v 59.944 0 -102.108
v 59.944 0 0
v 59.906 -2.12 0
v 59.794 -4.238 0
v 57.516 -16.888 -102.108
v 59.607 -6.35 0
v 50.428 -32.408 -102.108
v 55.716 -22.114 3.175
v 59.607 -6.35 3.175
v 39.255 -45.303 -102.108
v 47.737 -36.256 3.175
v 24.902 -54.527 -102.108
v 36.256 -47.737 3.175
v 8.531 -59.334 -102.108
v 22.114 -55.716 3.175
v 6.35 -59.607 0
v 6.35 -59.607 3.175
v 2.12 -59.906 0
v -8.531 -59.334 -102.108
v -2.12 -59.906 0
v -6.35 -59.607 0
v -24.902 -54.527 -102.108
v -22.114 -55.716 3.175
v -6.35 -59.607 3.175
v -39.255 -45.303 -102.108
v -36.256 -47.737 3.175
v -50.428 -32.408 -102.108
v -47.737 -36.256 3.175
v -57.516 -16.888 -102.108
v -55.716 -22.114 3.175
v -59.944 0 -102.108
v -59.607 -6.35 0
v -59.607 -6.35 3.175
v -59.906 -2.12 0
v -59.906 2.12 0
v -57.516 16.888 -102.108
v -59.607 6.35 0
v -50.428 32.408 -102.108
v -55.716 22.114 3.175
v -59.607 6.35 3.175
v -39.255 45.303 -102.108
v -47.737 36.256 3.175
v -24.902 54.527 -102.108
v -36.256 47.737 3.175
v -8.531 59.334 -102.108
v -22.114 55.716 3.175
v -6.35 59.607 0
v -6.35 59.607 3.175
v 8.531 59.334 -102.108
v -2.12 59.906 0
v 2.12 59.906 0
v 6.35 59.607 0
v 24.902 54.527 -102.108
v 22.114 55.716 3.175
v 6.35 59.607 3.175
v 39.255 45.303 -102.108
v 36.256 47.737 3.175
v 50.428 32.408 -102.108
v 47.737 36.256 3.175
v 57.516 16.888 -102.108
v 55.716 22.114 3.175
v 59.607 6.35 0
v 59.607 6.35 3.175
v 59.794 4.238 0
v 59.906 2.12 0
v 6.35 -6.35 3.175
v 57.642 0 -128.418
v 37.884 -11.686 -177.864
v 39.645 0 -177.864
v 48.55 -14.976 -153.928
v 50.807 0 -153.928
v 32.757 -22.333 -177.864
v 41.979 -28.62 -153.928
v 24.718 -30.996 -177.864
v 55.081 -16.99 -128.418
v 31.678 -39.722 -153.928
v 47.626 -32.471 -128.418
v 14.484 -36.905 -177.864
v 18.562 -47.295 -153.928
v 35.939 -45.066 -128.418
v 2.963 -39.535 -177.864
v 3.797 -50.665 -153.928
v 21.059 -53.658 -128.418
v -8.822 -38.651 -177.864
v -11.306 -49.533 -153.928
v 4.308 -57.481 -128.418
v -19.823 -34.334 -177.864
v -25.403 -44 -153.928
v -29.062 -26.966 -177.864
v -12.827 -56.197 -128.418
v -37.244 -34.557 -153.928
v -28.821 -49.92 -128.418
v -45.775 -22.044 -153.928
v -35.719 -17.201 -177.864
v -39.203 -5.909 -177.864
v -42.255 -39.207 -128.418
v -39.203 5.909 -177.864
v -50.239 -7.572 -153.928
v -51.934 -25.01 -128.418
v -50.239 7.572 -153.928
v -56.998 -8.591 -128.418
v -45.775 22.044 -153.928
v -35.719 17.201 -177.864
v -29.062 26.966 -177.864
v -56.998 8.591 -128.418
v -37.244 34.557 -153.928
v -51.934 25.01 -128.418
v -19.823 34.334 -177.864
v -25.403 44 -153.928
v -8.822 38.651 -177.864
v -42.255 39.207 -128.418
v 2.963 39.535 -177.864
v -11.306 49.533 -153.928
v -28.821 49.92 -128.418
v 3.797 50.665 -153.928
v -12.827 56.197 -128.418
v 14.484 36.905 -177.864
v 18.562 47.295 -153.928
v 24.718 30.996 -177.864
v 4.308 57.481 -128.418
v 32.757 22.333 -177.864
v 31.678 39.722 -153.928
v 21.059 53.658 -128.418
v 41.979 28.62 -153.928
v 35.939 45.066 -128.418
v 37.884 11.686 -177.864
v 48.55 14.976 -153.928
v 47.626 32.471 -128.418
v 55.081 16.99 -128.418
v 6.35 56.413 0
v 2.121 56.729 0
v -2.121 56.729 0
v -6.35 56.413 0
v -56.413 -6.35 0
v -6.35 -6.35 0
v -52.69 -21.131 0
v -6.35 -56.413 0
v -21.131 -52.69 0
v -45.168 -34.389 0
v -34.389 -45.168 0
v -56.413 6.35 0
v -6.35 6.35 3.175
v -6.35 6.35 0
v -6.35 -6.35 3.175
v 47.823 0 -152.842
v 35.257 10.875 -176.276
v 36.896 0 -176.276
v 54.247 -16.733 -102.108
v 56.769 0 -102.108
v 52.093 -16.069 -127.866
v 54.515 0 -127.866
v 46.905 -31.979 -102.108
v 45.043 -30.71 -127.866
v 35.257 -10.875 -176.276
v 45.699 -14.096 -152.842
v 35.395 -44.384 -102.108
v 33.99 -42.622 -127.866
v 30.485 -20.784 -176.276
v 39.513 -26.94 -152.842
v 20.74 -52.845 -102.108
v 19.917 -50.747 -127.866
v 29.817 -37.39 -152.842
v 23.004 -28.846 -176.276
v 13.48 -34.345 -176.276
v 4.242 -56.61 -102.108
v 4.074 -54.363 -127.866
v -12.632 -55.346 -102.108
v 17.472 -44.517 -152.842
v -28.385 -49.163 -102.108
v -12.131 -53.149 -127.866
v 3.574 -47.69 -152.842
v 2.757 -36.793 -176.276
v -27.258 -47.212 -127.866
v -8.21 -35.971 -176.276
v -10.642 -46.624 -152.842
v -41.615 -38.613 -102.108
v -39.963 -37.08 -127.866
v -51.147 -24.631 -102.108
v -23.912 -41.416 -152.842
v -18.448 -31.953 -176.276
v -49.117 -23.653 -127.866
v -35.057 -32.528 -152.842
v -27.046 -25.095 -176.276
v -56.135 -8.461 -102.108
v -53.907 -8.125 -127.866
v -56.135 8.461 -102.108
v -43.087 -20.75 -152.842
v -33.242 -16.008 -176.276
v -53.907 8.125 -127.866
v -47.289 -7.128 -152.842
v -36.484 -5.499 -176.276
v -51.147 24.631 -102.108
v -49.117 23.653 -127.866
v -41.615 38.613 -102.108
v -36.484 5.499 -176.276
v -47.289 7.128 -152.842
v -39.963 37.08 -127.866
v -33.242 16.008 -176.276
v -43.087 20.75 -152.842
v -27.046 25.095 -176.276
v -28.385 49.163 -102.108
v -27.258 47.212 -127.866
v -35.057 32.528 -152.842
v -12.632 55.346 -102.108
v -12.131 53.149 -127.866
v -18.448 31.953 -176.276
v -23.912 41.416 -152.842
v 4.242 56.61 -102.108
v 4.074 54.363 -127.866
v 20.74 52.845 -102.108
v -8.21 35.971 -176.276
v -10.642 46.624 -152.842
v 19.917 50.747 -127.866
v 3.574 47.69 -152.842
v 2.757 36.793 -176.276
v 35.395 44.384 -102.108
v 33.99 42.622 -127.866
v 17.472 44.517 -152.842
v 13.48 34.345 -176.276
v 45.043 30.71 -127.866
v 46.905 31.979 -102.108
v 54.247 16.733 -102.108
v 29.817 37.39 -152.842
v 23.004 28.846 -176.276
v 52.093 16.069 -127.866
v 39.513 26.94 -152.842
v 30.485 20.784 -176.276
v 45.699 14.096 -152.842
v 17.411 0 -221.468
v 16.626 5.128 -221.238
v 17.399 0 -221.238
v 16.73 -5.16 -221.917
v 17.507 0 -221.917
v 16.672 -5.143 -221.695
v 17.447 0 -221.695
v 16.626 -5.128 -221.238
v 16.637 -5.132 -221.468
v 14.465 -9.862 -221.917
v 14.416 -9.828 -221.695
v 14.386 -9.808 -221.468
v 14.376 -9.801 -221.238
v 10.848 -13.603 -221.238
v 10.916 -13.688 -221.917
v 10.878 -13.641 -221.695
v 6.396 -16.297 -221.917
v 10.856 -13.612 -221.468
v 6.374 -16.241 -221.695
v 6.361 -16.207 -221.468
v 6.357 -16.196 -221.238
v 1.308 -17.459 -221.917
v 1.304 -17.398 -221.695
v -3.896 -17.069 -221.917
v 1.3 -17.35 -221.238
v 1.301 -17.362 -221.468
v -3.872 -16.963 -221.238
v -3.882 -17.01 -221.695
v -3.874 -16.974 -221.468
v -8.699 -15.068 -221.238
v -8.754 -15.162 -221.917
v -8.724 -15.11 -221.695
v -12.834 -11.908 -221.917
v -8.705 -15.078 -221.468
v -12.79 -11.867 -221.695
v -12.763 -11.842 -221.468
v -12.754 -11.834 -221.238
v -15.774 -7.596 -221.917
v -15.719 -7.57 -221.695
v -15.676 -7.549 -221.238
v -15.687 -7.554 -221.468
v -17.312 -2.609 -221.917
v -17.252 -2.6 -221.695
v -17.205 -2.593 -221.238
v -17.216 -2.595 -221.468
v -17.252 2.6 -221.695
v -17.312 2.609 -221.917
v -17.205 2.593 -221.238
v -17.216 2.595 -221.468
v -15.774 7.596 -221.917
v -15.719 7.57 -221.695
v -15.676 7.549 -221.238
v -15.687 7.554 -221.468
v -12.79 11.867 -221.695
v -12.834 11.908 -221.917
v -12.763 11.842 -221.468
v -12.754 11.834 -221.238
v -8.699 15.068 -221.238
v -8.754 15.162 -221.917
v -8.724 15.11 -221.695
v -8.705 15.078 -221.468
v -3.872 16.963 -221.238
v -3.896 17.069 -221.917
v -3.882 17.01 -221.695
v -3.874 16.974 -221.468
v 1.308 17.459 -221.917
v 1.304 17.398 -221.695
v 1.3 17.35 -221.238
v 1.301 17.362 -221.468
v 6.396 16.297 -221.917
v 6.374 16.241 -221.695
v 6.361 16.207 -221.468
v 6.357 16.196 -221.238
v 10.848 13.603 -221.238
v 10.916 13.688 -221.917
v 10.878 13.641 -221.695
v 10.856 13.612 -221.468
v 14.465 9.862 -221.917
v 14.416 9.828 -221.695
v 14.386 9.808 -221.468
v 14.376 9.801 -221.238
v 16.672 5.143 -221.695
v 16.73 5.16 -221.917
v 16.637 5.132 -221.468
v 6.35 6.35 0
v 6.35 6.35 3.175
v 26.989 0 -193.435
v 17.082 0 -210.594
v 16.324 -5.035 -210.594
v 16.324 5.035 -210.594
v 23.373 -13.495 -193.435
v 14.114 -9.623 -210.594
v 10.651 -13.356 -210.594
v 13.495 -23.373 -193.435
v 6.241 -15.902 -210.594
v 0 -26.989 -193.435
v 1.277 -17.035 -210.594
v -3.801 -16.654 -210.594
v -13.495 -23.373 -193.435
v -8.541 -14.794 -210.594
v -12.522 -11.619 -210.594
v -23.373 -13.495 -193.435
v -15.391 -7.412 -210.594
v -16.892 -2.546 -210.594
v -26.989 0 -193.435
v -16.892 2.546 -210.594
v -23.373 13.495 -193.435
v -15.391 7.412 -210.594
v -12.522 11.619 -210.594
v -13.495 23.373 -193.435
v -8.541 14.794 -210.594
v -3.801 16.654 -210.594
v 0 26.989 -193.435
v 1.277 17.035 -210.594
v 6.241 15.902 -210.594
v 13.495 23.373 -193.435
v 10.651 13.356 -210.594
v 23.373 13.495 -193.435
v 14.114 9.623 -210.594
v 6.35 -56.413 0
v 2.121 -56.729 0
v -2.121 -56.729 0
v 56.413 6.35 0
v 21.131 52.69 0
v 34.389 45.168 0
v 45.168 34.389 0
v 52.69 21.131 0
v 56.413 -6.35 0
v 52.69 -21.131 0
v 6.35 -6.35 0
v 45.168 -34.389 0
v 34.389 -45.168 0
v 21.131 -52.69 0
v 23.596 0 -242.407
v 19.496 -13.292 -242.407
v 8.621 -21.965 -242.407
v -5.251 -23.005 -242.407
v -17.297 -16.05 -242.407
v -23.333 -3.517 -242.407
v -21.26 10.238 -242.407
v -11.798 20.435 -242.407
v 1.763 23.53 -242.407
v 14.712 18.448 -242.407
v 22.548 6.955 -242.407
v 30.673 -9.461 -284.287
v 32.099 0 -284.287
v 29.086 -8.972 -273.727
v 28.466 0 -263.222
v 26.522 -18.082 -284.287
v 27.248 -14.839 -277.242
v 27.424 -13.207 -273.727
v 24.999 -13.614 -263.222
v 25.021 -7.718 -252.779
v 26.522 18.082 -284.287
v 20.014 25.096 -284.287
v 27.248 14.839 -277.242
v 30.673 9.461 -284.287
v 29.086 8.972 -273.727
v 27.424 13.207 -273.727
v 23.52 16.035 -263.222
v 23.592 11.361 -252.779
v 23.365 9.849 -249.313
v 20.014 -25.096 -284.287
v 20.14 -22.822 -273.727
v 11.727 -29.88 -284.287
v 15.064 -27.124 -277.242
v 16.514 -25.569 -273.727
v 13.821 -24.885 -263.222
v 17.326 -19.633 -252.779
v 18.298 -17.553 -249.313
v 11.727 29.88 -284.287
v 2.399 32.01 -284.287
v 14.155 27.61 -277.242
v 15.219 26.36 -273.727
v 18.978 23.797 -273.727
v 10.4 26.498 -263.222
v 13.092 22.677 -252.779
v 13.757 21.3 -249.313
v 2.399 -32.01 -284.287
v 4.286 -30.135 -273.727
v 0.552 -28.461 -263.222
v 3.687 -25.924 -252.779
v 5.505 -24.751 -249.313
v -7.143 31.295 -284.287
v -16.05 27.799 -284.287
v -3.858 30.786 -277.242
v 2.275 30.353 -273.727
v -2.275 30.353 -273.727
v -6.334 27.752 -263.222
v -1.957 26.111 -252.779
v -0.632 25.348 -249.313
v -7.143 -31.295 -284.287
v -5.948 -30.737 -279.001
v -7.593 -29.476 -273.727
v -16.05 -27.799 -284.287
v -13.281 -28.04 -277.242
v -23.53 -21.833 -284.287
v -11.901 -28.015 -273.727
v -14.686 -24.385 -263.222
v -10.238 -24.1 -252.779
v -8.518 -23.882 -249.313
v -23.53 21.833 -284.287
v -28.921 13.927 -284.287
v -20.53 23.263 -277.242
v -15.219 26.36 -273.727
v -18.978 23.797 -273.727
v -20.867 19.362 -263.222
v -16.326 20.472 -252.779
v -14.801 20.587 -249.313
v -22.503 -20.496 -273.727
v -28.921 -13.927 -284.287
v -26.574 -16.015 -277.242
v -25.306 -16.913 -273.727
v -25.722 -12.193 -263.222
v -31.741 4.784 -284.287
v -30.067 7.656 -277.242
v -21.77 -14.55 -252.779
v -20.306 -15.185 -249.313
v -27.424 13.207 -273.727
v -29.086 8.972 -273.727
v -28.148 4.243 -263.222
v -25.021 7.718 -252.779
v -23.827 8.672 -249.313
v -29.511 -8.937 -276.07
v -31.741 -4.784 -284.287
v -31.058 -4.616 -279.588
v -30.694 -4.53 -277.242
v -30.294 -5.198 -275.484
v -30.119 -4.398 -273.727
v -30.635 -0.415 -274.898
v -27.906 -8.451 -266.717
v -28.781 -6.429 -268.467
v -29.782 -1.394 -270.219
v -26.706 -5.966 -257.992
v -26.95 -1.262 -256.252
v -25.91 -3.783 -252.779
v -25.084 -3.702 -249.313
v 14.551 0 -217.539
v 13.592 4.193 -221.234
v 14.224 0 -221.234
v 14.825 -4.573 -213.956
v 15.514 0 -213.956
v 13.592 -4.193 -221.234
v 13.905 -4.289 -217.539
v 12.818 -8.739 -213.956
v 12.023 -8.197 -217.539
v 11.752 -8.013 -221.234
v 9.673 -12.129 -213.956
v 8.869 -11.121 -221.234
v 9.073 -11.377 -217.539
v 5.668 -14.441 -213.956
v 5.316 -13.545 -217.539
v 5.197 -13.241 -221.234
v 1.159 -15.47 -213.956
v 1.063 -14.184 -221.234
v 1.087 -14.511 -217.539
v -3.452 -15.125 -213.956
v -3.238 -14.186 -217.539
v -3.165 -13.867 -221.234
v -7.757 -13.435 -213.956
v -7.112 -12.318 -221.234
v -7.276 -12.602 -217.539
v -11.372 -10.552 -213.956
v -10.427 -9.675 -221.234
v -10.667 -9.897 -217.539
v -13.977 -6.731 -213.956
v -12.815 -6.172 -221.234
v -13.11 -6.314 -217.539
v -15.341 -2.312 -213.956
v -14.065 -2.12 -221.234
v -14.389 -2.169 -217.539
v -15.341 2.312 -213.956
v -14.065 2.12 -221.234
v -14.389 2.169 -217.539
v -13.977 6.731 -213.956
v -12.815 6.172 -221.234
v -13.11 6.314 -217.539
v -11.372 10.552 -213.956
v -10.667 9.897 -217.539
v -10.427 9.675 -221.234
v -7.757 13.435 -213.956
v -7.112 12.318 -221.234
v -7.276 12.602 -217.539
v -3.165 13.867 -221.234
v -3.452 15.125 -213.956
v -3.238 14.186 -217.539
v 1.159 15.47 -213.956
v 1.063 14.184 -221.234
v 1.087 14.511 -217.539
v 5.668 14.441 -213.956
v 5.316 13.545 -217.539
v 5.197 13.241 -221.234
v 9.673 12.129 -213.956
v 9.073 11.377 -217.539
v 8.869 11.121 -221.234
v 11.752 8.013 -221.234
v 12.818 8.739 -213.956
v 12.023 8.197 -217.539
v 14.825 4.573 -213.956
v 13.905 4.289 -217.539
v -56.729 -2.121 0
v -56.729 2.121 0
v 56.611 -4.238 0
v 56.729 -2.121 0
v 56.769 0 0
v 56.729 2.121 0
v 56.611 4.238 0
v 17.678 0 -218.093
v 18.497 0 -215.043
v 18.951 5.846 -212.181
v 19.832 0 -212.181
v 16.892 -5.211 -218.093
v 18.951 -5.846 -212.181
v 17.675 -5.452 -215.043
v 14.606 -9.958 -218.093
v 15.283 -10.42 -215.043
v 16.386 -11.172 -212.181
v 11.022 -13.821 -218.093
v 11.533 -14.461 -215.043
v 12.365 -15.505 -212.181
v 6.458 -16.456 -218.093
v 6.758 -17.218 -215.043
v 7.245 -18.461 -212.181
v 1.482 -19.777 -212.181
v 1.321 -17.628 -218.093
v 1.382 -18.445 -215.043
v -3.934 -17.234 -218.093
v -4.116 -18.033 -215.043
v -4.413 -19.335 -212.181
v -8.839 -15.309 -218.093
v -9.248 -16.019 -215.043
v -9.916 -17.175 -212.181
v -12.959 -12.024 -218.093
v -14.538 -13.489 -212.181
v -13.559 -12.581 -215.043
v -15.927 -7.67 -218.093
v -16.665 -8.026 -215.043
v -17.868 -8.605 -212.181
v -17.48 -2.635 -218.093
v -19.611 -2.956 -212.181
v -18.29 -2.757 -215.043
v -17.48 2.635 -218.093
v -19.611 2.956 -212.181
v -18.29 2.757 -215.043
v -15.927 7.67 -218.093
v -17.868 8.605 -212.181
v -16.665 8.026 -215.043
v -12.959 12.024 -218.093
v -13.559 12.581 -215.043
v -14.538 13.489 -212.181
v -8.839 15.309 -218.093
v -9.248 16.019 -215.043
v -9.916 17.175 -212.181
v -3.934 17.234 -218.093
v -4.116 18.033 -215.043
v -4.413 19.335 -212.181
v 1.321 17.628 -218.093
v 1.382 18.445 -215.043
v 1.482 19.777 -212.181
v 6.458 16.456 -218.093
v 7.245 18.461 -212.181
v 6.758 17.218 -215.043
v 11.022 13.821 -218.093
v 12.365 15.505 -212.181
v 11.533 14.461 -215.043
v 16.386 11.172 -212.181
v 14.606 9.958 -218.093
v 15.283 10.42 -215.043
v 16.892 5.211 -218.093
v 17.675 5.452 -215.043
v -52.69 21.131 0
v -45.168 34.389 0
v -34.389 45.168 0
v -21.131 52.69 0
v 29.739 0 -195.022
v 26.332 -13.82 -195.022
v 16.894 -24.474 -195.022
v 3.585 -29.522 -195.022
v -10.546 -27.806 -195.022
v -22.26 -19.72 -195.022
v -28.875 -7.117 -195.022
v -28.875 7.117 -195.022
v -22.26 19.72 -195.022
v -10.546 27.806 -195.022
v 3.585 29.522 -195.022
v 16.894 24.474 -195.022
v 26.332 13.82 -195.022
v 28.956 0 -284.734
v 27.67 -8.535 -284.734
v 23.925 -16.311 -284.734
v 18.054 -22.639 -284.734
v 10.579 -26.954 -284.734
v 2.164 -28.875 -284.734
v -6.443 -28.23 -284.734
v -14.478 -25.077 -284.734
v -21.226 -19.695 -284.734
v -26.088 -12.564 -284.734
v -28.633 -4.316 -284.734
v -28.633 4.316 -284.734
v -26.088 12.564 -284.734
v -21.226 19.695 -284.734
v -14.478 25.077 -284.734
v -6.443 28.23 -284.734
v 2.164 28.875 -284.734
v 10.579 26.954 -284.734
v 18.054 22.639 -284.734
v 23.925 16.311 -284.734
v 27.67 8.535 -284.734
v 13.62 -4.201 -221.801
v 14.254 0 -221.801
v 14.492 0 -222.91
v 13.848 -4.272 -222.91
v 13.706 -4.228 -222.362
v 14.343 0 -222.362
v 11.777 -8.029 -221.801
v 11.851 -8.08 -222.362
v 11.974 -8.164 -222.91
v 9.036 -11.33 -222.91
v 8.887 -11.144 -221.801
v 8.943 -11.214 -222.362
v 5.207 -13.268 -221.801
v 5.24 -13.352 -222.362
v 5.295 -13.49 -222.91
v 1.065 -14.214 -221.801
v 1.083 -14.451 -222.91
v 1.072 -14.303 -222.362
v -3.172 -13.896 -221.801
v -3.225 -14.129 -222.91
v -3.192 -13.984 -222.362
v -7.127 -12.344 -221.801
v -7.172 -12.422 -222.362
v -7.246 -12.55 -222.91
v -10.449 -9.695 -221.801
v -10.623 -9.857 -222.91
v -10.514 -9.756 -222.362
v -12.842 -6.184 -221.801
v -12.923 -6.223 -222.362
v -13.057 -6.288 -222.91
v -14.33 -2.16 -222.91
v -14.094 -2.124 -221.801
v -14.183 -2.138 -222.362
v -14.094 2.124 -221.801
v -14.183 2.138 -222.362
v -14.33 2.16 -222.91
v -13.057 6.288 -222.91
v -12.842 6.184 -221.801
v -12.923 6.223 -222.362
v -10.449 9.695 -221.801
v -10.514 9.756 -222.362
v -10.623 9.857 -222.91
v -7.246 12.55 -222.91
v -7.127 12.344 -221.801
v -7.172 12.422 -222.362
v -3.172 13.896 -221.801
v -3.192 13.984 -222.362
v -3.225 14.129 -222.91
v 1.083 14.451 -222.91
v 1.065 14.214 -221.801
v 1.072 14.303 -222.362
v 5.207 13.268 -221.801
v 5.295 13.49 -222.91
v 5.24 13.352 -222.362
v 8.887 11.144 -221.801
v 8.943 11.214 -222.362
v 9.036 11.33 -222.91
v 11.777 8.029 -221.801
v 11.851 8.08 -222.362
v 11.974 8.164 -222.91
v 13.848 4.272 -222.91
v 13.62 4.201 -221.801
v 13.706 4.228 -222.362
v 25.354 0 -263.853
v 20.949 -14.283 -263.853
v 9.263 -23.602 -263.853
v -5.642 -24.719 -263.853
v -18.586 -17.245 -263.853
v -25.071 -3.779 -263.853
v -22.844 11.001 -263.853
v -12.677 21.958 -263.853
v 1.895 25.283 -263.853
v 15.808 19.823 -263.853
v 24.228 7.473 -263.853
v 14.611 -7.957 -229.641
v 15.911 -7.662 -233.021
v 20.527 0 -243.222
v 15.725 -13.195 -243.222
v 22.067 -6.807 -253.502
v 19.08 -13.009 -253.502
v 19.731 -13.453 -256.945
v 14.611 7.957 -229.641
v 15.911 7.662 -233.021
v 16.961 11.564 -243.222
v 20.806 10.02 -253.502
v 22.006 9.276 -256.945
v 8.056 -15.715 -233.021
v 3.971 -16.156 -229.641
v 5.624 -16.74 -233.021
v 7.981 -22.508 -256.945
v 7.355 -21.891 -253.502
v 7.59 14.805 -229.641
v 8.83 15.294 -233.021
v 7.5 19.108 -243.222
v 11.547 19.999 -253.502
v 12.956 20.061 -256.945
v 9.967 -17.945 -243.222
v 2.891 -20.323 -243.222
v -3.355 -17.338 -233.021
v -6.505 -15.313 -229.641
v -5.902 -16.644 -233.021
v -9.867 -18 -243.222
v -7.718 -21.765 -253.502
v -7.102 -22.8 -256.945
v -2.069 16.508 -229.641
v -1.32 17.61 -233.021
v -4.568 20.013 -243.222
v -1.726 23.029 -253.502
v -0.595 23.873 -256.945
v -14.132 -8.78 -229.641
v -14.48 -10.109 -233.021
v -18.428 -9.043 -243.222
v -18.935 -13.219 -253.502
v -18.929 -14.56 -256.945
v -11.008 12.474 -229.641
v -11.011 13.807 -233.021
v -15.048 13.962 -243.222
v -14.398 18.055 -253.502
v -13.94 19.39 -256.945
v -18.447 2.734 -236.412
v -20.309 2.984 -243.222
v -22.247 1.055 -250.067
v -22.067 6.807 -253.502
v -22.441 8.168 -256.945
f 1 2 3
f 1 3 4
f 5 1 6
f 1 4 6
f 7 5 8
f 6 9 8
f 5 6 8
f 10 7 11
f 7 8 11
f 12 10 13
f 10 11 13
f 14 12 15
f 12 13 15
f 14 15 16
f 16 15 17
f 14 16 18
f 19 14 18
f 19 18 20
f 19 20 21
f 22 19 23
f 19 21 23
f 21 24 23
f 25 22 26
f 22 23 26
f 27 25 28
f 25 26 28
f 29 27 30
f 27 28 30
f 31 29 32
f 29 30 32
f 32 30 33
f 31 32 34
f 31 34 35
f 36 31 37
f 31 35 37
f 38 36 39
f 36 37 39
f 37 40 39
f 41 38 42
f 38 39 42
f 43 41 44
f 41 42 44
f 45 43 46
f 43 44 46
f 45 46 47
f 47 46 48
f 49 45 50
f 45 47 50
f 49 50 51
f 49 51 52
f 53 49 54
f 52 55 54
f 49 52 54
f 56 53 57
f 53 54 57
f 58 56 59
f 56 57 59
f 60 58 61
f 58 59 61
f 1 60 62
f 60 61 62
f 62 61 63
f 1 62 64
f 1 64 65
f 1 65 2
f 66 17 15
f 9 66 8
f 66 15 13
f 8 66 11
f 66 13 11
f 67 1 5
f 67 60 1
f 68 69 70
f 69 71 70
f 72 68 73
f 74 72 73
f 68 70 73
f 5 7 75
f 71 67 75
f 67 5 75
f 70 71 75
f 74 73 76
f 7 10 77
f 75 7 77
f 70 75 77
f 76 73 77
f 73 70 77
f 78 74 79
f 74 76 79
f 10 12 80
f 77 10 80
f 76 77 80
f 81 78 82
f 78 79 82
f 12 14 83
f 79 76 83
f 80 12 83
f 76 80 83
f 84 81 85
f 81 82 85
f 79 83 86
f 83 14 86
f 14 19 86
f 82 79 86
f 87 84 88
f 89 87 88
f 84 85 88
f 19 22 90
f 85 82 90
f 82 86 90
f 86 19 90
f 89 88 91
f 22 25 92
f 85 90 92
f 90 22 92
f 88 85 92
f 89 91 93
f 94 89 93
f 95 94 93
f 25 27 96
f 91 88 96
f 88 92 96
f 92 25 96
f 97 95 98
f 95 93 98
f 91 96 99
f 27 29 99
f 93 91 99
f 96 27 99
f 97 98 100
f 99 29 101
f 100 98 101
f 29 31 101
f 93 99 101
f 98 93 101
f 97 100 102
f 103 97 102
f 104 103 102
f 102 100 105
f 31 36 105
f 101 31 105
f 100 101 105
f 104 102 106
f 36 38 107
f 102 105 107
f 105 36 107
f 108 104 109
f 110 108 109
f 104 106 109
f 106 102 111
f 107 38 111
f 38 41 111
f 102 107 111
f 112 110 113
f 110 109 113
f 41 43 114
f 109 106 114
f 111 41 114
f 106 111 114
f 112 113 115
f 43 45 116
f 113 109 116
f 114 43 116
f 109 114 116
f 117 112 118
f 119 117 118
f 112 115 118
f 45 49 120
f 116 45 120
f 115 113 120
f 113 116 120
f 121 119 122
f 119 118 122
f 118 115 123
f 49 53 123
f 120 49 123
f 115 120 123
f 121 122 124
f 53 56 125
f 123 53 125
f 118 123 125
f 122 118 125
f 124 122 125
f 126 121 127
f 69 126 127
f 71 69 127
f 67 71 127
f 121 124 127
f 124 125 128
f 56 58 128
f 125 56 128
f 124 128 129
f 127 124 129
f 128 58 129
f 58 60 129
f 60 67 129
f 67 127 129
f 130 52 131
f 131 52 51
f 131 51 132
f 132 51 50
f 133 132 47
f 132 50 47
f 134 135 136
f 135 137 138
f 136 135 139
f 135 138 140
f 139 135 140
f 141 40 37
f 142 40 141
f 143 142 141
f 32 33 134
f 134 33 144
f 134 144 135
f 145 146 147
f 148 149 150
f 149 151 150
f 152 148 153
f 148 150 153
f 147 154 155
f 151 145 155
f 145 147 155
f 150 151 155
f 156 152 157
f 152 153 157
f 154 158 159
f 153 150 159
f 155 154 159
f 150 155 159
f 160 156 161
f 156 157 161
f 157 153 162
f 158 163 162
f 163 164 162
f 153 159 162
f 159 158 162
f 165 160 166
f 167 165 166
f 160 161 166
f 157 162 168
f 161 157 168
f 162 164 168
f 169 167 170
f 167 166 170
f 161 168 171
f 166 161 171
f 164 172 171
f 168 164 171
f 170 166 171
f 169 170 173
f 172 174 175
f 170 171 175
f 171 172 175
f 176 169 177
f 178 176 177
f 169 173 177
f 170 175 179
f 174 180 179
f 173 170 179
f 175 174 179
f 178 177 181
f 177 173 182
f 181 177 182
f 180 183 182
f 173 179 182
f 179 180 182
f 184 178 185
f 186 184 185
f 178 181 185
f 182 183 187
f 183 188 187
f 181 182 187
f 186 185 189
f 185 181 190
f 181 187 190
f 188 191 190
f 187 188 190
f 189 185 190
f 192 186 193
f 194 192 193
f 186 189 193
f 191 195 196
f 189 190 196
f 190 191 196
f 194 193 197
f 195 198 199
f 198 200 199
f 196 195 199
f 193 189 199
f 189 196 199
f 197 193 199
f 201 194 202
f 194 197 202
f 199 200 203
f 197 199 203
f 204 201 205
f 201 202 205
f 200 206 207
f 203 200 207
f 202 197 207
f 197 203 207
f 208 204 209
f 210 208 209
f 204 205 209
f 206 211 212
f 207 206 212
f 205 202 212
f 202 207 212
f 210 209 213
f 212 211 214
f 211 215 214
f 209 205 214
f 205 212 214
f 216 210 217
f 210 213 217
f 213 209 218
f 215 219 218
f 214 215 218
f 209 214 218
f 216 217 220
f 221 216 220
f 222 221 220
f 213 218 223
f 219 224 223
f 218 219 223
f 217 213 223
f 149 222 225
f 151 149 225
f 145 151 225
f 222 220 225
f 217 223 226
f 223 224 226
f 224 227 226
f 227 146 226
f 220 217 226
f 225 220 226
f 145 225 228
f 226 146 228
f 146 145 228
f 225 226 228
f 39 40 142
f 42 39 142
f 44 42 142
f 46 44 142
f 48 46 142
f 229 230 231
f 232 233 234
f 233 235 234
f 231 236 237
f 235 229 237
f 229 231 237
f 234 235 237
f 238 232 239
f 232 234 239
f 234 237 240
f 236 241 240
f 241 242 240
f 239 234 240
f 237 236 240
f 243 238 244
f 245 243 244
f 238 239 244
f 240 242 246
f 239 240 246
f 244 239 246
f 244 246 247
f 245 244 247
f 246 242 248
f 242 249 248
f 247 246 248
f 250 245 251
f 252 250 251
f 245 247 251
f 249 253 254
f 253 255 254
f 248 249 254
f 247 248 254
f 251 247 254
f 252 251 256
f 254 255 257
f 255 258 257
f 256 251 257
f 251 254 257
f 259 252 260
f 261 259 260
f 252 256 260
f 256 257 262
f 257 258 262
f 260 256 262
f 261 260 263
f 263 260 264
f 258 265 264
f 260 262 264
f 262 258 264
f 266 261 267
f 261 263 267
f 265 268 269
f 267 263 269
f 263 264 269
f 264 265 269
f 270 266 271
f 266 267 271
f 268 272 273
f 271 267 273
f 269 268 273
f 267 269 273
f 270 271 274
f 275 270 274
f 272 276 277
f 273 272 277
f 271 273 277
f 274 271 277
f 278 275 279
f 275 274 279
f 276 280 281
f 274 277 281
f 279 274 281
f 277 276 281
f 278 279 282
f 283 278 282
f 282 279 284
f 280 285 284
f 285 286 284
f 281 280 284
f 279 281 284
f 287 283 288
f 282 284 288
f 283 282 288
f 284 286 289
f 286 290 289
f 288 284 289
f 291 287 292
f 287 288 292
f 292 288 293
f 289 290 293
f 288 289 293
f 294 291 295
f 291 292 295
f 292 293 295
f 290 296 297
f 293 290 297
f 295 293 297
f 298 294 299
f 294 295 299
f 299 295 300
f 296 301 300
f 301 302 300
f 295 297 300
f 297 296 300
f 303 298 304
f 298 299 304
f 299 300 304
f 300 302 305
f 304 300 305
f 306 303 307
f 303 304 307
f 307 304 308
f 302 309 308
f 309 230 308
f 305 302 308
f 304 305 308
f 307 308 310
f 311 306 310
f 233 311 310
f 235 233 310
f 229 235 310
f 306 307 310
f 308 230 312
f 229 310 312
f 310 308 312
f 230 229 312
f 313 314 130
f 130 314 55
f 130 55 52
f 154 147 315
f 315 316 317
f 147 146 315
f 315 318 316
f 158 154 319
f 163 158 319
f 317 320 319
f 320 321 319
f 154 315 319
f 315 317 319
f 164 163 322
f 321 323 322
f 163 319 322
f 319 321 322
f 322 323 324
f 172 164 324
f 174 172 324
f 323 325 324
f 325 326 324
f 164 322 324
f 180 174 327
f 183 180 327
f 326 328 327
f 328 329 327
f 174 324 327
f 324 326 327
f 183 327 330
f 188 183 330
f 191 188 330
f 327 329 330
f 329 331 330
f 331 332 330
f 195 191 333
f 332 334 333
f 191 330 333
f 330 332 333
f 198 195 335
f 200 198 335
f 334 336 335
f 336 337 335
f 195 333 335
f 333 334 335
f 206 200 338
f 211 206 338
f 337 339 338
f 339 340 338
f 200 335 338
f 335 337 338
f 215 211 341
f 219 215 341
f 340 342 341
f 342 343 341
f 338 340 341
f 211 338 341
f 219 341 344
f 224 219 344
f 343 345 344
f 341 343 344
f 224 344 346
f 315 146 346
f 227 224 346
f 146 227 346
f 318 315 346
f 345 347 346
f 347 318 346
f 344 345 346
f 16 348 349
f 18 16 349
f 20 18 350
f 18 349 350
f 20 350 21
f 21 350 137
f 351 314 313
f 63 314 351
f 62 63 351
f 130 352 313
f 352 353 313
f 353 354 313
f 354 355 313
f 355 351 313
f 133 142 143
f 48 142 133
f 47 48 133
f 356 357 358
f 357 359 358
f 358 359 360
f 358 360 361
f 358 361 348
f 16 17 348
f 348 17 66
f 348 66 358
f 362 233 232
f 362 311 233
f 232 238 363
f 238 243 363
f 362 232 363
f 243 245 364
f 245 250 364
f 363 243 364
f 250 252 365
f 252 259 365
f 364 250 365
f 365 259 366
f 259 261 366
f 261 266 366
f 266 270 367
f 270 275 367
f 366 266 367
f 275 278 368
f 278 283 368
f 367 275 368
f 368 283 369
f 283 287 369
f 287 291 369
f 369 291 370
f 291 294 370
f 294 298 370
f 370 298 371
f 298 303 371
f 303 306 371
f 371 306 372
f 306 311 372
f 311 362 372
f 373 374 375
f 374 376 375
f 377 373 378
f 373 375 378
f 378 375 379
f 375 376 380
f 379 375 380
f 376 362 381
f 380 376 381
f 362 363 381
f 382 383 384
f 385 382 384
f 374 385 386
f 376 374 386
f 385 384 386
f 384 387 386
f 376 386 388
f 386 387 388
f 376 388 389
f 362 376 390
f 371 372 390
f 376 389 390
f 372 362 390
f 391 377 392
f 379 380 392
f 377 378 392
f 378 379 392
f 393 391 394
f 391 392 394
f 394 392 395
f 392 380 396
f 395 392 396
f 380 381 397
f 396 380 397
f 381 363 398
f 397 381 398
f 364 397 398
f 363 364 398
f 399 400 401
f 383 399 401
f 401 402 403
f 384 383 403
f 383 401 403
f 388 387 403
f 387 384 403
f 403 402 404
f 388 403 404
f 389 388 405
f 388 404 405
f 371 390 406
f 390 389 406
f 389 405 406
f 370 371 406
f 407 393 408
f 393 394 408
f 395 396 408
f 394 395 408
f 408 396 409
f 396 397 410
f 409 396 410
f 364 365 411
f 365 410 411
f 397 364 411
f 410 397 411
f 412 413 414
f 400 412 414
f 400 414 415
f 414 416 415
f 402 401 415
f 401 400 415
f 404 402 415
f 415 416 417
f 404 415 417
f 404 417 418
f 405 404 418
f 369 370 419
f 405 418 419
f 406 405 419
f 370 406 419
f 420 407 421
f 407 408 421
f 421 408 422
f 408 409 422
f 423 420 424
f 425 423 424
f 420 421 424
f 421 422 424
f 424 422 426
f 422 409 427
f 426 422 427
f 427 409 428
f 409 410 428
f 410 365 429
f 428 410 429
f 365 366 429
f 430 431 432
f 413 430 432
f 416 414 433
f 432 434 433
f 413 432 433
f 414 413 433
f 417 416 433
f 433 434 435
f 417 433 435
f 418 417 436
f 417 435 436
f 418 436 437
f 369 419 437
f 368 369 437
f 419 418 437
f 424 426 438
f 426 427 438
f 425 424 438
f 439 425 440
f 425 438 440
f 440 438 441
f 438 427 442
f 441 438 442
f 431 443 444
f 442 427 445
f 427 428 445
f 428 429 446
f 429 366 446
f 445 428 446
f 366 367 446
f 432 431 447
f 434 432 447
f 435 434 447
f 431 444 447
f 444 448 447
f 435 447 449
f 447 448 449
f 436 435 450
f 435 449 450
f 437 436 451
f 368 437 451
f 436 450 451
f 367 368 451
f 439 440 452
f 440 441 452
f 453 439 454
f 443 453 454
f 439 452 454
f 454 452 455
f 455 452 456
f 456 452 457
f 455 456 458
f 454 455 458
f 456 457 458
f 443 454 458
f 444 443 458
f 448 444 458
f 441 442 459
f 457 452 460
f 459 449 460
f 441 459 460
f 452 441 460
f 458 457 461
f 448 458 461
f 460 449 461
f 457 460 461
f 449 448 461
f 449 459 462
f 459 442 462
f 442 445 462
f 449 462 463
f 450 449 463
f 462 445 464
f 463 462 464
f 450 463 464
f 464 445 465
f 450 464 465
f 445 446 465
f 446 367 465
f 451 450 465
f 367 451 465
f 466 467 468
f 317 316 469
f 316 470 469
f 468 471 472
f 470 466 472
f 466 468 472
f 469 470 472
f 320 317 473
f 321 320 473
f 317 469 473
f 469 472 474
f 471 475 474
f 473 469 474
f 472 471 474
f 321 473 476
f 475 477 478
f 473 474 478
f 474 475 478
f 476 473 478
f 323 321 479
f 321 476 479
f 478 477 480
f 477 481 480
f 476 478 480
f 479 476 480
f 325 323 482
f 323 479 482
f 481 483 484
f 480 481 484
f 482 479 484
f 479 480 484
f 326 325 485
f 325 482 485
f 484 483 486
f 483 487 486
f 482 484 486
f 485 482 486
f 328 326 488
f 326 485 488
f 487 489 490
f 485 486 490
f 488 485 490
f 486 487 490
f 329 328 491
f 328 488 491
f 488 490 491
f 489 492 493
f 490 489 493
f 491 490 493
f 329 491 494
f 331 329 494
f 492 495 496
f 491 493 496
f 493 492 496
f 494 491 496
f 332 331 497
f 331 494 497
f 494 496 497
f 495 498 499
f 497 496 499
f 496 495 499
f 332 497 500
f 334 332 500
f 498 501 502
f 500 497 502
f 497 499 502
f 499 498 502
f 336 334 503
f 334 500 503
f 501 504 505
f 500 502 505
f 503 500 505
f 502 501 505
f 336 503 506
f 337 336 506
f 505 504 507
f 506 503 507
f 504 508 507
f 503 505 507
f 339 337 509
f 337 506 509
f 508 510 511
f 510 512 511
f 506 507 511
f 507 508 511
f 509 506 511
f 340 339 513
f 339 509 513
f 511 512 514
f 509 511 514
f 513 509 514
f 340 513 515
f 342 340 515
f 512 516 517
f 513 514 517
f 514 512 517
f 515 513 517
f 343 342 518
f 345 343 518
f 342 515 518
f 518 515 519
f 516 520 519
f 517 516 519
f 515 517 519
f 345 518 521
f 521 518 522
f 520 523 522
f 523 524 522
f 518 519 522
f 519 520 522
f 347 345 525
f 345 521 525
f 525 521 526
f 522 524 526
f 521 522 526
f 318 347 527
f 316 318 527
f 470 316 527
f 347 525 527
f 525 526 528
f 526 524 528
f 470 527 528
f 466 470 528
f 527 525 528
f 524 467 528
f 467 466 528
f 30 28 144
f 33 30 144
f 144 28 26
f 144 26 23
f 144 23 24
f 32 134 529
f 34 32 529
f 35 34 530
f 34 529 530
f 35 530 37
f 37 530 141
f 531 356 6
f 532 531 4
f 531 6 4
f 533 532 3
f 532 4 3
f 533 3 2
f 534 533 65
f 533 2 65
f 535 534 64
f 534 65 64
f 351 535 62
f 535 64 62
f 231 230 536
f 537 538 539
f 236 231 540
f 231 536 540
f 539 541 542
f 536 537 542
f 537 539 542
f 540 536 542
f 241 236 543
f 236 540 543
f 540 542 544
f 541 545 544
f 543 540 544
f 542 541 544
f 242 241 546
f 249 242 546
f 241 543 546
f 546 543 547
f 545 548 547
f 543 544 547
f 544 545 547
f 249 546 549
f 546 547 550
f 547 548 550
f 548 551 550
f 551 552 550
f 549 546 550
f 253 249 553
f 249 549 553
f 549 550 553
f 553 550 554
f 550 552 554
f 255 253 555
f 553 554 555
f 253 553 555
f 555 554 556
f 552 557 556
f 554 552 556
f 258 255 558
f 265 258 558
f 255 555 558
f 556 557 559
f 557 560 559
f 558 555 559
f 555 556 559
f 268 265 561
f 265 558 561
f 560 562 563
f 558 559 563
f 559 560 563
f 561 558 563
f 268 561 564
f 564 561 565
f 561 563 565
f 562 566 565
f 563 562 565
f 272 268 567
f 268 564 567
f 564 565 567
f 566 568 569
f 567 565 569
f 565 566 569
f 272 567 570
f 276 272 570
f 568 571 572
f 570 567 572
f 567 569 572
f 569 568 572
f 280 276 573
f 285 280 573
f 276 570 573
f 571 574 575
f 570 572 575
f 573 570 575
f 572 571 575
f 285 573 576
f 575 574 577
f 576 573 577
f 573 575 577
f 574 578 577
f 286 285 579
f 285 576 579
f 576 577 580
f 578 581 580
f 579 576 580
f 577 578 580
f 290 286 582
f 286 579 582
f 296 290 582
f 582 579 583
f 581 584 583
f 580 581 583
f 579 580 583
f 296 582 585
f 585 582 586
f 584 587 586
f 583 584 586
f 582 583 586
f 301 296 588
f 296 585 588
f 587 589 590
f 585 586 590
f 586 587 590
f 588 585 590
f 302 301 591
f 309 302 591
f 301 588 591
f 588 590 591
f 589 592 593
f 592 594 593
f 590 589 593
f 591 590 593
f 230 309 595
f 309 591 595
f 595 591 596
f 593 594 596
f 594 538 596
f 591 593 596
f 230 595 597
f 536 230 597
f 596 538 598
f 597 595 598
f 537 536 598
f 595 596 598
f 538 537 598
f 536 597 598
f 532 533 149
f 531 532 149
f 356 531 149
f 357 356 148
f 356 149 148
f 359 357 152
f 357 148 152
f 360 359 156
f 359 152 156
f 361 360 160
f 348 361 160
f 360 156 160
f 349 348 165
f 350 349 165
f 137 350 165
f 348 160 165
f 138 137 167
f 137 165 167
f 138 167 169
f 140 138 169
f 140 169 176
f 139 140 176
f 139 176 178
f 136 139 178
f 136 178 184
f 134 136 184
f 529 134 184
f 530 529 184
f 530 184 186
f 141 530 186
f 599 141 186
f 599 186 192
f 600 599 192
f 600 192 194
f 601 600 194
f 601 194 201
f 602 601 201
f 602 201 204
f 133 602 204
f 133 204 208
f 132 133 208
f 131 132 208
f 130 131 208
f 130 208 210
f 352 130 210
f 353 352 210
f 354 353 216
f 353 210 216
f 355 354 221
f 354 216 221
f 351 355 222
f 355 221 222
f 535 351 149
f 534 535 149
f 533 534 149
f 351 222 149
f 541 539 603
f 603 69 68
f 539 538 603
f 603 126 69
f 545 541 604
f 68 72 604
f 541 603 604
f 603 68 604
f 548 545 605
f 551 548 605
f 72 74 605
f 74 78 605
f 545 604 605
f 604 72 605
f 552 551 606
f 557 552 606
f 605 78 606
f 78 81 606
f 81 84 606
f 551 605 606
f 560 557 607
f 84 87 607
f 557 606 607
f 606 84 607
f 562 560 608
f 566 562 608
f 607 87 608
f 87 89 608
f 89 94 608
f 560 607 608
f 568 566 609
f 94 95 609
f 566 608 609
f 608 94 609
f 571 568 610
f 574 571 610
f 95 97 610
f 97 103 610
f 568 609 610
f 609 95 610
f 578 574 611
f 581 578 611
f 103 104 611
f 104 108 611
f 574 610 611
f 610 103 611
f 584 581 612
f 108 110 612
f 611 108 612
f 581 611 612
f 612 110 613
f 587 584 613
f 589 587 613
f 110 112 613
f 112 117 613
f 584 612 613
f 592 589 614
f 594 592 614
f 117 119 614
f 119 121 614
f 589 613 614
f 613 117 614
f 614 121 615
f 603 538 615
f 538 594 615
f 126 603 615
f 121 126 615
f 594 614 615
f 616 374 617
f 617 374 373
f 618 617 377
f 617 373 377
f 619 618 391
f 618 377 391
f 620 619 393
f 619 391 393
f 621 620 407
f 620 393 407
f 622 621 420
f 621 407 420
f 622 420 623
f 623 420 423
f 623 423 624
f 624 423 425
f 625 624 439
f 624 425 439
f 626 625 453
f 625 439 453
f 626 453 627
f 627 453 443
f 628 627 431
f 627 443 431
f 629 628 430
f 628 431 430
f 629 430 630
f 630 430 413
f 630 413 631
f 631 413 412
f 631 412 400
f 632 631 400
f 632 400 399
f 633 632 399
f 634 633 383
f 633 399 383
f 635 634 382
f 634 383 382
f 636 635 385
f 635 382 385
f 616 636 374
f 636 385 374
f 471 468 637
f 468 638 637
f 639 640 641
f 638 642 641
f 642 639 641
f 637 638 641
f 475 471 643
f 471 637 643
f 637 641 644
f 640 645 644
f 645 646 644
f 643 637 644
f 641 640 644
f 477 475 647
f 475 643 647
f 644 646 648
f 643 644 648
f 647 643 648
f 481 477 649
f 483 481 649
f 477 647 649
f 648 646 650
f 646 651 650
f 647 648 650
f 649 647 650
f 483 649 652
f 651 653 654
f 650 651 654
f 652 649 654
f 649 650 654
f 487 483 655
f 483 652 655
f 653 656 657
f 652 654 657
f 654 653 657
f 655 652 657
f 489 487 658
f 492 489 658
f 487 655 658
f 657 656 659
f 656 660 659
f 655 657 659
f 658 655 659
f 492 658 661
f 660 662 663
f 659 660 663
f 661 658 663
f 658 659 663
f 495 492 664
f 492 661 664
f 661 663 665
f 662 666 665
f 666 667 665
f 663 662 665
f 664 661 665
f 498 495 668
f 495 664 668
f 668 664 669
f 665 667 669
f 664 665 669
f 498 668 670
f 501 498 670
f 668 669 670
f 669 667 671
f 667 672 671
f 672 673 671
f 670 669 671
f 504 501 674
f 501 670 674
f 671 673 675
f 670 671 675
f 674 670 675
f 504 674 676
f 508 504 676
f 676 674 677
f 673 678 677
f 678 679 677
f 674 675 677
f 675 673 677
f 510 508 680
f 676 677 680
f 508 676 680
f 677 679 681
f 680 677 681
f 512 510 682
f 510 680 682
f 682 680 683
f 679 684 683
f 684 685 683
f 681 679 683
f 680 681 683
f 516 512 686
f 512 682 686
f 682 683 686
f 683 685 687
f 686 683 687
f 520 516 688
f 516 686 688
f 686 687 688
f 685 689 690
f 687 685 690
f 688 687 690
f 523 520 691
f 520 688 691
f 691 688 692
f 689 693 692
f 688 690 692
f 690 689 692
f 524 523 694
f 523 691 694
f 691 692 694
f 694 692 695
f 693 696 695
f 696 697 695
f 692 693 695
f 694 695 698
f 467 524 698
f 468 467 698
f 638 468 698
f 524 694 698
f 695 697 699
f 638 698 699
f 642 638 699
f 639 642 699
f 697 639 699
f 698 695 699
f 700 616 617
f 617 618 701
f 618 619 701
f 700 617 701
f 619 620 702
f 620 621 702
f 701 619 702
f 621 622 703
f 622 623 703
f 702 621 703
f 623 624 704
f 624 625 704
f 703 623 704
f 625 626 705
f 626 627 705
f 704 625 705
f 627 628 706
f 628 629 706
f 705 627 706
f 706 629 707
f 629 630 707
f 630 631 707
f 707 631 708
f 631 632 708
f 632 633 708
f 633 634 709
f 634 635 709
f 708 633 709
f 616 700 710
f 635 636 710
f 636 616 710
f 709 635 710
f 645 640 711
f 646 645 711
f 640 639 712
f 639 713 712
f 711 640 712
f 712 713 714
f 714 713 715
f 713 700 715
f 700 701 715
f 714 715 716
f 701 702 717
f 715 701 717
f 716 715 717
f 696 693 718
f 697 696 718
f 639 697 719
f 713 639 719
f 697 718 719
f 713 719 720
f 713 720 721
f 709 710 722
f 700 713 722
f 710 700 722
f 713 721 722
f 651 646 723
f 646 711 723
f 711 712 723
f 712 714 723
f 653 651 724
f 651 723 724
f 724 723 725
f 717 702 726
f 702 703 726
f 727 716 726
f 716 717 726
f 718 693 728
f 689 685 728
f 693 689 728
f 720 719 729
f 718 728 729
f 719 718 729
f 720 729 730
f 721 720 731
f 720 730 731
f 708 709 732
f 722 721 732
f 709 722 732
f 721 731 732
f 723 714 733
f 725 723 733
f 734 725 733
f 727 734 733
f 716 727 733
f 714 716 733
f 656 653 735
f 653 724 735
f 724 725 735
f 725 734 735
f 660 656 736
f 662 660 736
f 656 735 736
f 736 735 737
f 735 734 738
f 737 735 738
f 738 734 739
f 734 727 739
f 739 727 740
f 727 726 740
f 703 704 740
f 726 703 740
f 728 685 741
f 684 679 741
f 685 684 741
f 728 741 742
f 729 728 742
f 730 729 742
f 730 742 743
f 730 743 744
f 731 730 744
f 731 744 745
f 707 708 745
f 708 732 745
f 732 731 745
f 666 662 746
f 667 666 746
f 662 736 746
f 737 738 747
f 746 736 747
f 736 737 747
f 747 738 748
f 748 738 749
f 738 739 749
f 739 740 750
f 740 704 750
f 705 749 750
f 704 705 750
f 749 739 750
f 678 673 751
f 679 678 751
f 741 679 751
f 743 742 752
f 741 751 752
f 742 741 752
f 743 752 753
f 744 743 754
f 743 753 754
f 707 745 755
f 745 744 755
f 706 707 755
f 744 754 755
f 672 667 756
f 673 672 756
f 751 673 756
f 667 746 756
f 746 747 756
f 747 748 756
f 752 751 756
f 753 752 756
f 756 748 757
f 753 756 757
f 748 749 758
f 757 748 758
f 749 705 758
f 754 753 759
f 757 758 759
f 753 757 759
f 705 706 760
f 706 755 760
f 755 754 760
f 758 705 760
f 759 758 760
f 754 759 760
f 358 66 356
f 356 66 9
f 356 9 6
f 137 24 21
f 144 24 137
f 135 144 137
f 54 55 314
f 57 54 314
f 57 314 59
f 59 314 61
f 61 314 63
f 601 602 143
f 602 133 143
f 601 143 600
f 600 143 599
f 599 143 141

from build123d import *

# Parameters (mm, degrees)
SKETCH4_W          = 3.175
SKETCH4_H          = 12.7
CUT_EXTRUDE1_DEPTH = 298.085874974
CIRPATTERN1_COUNT  = 2
CIRPATTERN1_ANGLE  = 90


with BuildPart() as part:
    # Sketch2 → Revolve-Thin4 (revolve)
    with BuildSketch(Plane(origin=(0, 0, 0), x_dir=(0, 0, -1), z_dir=(1, 0, 0)), mode=Mode.PRIVATE) as revolve_thin4_sk:
        with BuildLine():
            Line((0, 0), (0, 56.769))
            Line((0, 56.769), (102.108, 56.769))
            ThreePointArc((102.108, 56.769), (140.500181874, 51.714573368), (176.276, 36.895744296))
            Line((176.276, 36.895744296), (210.593607924, 17.082464123))
            ThreePointArc((210.593607924, 17.082464123), (215.726112327, 14.954565751), (221.234, 14.224))
            ThreePointArc((221.234, 14.224), (222.082948, 14.290879198), (222.910433569, 14.49200893))
            ThreePointArc((222.910433569, 14.49200893), (253.5018987, 23.093142917), (284.734, 28.956))
            Line((284.734, 28.956), (284.286874616, 32.099358696))
            ThreePointArc((284.286874616, 32.099358696), (252.778619357, 26.184662284), (221.916664766, 17.507477147))
            ThreePointArc((221.916664766, 17.507477147), (221.581730132, 17.426067494), (221.238108322, 17.398997342))
            ThreePointArc((221.238108322, 17.398997342), (216.549846791, 18.020847951), (212.181107924, 19.83209478))
            Line((212.181107924, 19.83209478), (177.8635, 39.645374953))
            ThreePointArc((177.8635, 39.645374953), (141.321932343, 54.781387867), (102.108, 59.944))
            Line((102.108, 59.944), (-3.175, 59.944))
            Line((-3.175, 59.944), (-3.175, 0))
            Line((-3.175, 0), (0, 0))
        make_face()
    revolve(revolve_thin4_sk.sketch.rotate(Axis((0, 0, 0), (0, 0, -1)), 90), axis=Axis((0, 0, 0), (0, 0, -1)))

    # Sketch4 → Cut-Extrude1 (cut, symmetric)
    with BuildSketch(Plane(origin=(0, 0, 0), x_dir=(0, 0, -1), z_dir=(1, 0, 0))):
        with Locations((-1.5875, 0)):
            Rectangle(SKETCH4_W, SKETCH4_H)
    cut_extrude1 = extrude(amount=CUT_EXTRUDE1_DEPTH, both=True, mode=Mode.SUBTRACT)

    # CirPattern1: Cut-Extrude1 ×2 about axis
    cirpattern1_axis = Axis((0, 0, 3.175), (0, 0, 1))
    for i in range(1, CIRPATTERN1_COUNT):
        add(cut_extrude1.rotate(cirpattern1_axis, i * CIRPATTERN1_ANGLE / (CIRPATTERN1_COUNT - 1)), mode=Mode.SUBTRACT)


solid = part.part
